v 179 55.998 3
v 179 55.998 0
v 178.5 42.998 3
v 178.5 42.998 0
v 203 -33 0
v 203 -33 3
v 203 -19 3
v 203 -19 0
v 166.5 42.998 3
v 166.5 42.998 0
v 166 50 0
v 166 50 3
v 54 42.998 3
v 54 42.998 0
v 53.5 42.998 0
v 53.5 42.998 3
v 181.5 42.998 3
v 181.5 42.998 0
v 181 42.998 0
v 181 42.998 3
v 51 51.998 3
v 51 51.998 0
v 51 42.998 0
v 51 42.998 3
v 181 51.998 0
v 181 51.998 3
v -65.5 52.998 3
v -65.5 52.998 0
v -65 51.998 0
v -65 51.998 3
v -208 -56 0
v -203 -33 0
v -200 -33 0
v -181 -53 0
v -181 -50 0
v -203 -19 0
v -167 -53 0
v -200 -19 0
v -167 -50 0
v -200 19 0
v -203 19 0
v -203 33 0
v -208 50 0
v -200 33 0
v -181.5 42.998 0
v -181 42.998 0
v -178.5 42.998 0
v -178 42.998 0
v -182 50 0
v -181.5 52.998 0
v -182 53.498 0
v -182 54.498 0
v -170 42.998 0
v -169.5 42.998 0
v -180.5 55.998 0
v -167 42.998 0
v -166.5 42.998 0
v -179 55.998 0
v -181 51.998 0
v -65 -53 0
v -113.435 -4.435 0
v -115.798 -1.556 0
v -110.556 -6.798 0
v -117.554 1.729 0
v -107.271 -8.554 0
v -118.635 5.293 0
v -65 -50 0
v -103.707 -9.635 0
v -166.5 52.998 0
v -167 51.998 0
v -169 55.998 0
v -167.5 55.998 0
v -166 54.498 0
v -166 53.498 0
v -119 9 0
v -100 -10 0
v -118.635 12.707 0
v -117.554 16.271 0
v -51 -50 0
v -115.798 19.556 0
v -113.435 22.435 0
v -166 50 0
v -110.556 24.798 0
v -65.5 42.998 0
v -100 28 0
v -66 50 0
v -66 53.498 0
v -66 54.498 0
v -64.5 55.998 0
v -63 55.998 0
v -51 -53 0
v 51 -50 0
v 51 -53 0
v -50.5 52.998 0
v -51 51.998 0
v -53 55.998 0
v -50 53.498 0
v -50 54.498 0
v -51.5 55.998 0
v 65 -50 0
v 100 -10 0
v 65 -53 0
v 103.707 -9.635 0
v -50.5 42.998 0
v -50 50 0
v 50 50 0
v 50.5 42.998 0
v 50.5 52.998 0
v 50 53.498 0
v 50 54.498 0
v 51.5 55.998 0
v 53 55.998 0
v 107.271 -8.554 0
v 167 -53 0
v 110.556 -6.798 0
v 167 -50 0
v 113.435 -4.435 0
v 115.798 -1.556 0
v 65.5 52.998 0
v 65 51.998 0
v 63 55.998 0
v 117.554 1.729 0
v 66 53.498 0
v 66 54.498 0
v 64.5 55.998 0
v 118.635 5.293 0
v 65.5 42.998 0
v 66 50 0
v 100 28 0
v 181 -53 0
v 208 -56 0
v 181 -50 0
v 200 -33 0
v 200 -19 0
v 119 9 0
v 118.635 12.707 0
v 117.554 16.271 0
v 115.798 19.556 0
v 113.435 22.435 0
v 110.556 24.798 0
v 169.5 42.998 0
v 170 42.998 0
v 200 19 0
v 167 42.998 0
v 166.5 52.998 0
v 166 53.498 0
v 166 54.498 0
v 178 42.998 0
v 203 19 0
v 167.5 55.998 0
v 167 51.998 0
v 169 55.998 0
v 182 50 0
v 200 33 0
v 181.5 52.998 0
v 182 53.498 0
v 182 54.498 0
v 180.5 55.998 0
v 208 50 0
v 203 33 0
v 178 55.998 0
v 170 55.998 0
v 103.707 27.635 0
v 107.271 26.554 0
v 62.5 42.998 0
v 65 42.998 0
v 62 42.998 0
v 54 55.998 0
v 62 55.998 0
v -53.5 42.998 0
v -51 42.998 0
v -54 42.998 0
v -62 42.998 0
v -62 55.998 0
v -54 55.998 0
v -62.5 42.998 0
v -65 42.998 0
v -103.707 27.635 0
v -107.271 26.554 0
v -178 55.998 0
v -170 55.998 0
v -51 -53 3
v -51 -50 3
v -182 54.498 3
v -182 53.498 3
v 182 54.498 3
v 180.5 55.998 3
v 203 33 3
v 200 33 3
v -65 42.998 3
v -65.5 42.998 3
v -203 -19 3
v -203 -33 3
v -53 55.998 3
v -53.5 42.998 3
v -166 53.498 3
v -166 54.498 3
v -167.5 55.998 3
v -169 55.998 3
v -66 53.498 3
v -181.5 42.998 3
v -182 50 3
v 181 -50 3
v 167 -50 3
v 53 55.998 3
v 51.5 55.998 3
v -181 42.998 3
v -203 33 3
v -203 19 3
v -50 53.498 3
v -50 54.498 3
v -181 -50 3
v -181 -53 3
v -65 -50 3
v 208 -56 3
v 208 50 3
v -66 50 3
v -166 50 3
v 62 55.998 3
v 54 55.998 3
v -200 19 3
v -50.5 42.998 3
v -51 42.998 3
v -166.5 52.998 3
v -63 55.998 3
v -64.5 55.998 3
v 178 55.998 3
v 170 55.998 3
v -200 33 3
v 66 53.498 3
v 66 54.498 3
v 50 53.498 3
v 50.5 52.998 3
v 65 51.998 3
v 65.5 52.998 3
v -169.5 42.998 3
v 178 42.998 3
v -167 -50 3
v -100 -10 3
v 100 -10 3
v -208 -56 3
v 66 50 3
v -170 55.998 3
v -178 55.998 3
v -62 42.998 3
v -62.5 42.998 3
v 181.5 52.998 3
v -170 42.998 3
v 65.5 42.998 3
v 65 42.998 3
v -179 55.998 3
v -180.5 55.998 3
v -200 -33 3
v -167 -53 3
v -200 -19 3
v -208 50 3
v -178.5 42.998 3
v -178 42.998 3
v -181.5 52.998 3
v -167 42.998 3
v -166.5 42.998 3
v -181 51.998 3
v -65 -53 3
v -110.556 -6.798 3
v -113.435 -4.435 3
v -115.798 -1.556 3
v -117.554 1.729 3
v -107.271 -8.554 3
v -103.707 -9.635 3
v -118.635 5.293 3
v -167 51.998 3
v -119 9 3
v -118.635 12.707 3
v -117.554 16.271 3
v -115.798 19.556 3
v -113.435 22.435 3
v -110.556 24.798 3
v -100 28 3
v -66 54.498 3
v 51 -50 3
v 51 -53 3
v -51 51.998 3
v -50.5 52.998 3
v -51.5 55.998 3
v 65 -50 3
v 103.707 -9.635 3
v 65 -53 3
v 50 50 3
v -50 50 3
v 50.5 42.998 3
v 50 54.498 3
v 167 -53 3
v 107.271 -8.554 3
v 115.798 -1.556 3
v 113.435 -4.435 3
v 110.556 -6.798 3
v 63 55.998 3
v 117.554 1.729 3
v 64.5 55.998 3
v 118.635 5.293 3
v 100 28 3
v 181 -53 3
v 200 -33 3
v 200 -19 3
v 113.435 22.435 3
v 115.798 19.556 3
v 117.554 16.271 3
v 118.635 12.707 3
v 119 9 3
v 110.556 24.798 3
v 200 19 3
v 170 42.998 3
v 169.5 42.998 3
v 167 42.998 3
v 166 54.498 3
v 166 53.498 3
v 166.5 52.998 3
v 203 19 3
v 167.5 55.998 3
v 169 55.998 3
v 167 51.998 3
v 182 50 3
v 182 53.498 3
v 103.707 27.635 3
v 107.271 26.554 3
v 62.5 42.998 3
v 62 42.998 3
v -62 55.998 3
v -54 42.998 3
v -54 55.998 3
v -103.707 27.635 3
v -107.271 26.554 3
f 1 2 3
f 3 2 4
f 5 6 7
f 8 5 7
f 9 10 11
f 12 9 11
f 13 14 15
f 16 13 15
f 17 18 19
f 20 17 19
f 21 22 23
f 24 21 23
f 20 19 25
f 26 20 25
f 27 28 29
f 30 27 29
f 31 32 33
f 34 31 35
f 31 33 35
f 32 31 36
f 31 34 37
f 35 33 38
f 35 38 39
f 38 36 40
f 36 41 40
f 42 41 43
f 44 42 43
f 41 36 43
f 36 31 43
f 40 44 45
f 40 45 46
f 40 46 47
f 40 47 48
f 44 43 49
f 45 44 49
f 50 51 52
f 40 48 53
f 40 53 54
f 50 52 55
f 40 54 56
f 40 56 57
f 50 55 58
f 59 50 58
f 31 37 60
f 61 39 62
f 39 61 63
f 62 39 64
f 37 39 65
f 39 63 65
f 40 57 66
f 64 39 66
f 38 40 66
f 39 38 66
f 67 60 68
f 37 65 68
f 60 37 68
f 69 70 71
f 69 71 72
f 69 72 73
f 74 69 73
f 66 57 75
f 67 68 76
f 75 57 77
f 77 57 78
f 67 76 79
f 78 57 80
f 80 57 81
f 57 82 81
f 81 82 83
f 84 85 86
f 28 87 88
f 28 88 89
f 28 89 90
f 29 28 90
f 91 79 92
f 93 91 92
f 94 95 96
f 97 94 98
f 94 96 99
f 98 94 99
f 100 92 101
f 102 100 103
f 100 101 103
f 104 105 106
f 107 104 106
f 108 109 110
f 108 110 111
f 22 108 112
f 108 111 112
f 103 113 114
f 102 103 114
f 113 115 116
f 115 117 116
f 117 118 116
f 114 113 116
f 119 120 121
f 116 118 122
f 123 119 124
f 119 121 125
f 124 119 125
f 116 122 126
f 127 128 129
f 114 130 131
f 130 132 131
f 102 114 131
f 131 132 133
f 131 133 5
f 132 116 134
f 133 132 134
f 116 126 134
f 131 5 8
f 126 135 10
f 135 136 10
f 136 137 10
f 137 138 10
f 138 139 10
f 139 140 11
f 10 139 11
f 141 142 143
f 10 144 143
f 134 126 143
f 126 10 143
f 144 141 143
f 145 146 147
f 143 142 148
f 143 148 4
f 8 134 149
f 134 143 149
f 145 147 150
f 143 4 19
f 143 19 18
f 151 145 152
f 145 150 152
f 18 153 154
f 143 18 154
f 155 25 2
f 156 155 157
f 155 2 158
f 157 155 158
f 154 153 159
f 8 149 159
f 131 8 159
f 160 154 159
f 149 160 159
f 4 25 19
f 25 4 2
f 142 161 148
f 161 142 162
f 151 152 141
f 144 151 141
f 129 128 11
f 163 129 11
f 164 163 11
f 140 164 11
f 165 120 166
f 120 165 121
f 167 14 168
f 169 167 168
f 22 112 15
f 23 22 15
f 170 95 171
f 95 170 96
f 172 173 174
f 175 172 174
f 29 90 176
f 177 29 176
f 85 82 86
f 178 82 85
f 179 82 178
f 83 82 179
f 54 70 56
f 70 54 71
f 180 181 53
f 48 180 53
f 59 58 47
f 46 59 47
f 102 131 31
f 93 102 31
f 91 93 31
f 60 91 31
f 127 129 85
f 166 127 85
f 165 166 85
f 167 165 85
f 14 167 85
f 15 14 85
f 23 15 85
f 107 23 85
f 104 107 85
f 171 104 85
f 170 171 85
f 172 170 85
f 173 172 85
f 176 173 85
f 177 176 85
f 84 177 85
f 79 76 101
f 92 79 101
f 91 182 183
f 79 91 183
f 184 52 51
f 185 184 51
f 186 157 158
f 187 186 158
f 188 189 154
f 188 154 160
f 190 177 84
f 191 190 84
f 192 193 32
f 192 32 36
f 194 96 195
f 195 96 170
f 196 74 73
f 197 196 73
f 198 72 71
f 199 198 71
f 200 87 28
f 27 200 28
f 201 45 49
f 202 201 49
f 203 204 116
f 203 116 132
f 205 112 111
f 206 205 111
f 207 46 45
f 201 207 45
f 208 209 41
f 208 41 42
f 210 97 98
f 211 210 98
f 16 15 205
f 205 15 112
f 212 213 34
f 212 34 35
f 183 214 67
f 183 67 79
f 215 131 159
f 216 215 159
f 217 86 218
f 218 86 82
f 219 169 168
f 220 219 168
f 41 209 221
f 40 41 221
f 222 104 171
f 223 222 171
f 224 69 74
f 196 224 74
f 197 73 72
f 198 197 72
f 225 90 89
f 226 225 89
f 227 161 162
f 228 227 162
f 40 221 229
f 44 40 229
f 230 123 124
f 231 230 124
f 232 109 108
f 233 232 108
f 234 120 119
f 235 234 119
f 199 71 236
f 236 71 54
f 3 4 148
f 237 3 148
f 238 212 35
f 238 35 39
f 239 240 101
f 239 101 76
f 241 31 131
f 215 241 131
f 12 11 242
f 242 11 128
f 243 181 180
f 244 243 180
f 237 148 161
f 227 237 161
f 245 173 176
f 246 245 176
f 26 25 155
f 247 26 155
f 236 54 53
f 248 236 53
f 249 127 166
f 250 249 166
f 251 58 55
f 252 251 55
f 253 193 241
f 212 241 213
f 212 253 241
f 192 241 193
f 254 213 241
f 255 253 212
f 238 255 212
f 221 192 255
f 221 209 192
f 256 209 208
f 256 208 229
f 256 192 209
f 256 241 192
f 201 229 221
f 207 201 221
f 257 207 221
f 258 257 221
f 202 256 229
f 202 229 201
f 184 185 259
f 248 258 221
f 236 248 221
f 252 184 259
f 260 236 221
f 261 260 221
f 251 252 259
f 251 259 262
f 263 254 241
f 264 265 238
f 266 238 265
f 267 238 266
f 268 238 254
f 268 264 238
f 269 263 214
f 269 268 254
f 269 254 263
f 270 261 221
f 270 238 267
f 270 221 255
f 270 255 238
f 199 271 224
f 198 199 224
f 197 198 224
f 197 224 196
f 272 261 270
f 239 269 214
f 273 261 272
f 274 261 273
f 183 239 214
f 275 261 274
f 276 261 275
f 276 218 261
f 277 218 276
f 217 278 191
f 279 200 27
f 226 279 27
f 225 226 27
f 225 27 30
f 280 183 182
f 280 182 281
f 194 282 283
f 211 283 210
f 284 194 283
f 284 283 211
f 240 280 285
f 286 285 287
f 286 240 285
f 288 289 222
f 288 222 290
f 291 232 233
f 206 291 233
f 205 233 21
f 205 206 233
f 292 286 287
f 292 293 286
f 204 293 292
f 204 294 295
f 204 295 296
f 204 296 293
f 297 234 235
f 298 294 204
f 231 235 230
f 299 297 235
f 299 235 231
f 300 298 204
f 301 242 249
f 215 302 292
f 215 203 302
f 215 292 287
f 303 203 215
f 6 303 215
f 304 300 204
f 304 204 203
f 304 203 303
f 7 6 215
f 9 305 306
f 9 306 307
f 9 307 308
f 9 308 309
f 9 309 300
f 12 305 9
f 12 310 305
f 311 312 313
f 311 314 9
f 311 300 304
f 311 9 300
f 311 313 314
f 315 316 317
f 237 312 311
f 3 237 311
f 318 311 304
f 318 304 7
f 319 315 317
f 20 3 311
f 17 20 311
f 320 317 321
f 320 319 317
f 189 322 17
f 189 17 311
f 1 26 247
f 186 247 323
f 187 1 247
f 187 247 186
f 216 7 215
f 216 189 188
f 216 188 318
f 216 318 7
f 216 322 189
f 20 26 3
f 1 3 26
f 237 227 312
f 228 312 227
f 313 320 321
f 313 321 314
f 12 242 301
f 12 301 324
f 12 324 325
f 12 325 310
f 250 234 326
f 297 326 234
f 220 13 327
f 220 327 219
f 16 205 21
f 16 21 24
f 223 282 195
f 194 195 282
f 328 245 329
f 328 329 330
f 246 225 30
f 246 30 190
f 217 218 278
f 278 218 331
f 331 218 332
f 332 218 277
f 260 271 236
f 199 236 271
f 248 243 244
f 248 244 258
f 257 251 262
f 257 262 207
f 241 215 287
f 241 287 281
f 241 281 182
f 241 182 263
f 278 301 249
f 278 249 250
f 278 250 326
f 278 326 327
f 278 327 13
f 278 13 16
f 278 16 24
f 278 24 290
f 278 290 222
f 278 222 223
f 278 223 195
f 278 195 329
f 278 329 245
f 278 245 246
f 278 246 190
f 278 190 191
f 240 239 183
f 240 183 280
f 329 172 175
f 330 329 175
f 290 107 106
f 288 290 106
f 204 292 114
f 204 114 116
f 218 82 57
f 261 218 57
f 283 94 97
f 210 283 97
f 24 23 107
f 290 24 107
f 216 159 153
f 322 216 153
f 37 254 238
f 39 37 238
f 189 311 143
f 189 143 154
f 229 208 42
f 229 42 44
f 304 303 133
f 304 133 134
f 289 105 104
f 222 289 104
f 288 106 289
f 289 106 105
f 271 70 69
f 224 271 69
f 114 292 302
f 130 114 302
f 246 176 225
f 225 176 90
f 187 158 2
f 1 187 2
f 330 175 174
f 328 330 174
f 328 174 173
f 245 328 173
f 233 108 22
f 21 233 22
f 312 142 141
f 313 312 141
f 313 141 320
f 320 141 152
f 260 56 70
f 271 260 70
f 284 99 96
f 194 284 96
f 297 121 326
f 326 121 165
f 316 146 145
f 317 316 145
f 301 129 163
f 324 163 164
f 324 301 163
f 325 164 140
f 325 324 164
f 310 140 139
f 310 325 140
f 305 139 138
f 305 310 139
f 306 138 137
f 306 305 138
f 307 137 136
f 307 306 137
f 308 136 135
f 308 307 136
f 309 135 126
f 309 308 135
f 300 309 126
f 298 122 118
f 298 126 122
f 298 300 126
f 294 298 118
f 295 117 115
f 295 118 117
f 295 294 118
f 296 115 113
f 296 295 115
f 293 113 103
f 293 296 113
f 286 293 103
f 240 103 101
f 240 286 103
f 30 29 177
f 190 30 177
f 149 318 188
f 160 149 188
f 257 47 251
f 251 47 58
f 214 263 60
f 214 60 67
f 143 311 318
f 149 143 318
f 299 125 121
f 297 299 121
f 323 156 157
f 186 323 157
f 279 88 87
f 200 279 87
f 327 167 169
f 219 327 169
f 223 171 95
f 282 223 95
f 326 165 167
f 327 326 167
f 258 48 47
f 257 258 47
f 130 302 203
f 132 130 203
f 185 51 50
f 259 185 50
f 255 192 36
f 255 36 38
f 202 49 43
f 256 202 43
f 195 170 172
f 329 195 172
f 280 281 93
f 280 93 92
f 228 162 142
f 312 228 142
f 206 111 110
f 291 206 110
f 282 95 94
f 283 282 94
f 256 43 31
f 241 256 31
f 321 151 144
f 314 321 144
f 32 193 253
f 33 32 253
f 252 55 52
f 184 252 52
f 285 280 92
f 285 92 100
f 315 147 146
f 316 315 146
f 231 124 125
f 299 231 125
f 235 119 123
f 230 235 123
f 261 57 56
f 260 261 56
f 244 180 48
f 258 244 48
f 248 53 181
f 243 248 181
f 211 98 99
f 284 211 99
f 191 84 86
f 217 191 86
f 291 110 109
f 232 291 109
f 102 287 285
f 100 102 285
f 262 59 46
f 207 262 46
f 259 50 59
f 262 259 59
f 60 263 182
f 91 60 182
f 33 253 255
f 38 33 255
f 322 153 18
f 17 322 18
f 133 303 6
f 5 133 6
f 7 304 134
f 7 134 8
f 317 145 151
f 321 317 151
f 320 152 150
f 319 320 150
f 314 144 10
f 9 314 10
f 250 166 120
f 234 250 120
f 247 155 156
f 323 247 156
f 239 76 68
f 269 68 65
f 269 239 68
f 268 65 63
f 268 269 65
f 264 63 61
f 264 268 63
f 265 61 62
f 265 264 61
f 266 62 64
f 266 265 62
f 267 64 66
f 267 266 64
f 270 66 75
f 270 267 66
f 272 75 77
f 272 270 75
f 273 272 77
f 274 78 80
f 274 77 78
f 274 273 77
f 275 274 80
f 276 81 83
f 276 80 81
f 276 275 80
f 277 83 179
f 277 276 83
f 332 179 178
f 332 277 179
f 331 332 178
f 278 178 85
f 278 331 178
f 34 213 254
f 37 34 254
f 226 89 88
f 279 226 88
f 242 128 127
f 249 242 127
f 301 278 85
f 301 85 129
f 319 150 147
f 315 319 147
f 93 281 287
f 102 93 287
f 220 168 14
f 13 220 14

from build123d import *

# Parameters (mm, degrees)
BOSS_EXTRUDE1_DEPTH = 3
CUT_EXTRUDE2_DEPTH  = 4
SKETCH8_W           = 14
SKETCH8_H           = 3
CUT_EXTRUDE3_DEPTH  = 3
SKETCH9_W           = 3
SKETCH9_H           = 14
CUT_EXTRUDE4_DEPTH  = 3


with BuildPart() as part:
    # Sketch1 → Boss-Extrude1 (new body)
    with BuildSketch(Plane.XY):
        Polygon((208, 50), (182, 50), (181.5, 42.997828908), (181, 42.997828908), (181, 51.997828908), (181.5, 52.997828908), (182, 53.497828908), (182, 54.497828908), (180.5, 55.997828908), (179, 55.997828908), (178.5, 42.997828908), (178, 42.997828908), (178, 55.997828908), (170, 55.997828908), (170, 42.997828908), (169.5, 42.997828908), (169, 55.997828908), (167.5, 55.997828908), (166, 54.497828908), (166, 53.497828908), (166.5, 52.997828908), (167, 51.997828908), (167, 42.997828908), (166.5, 42.997828908), (166, 50), (66, 50), (65.5, 42.997828908), (65, 42.997828908), (65, 51.997828908), (65.5, 52.997828908), (66, 53.497828908), (66, 54.497828908), (64.5, 55.997828908), (63, 55.997828908), (62.5, 42.997828908), (62, 42.997828908), (62, 55.997828908), (54, 55.997828908), (54, 42.997828908), (53.5, 42.997828908), (53, 55.997828908), (51.5, 55.997828908), (50, 54.497828908), (50, 53.497828908), (50.5, 52.997828908), (51, 51.997828908), (51, 42.997828908), (50.5, 42.997828908), (50, 50), (-50, 50), (-50.5, 42.997828908), (-51, 42.997828908), (-51, 51.997828908), (-50.5, 52.997828908), (-50, 53.497828908), (-50, 54.497828908), (-51.5, 55.997828908), (-53, 55.997828908), (-53.5, 42.997828908), (-54, 42.997828908), (-54, 55.997828908), (-62, 55.997828908), (-62, 42.997828908), (-62.5, 42.997828908), (-63, 55.997828908), (-64.5, 55.997828908), (-66, 54.497828908), (-66, 53.497828908), (-65.5, 52.997828908), (-65, 51.997828908), (-65, 42.997828908), (-65.5, 42.997828908), (-66, 50), (-166, 50), (-166.5, 42.997828908), (-167, 42.997828908), (-167, 51.997828908), (-166.5, 52.997828908), (-166, 53.497828908), (-166, 54.497828908), (-167.5, 55.997828908), (-169, 55.997828908), (-169.5, 42.997828908), (-170, 42.997828908), (-170, 55.997828908), (-178, 55.997828908), (-178, 42.997828908), (-178.5, 42.997828908), (-179, 55.997828908), (-180.5, 55.997828908), (-182, 54.497828908), (-182, 53.497828908), (-181.5, 52.997828908), (-181, 51.997828908), (-181, 42.997828908), (-181.5, 42.997828908), (-182, 50), (-208, 50), (-208, -56), (208, -56), align=None)
    extrude(amount=BOSS_EXTRUDE1_DEPTH)

    # Sketch4 → Cut-Extrude2 (cut, through all)
    with BuildSketch(Plane.XY.offset(3)):
        with BuildLine():
            Line((-100, 28), (100, 28))
            ThreePointArc((100, 28), (119, 9), (100, -10))
            Line((100, -10), (-100, -10))
            ThreePointArc((-100, -10), (-119, 9), (-100, 28))
        make_face()
    extrude(amount=-CUT_EXTRUDE2_DEPTH, mode=Mode.SUBTRACT)

    # Sketch8 → Cut-Extrude3 (cut)
    with BuildSketch(Plane.XY.offset(3)):
        with Locations((174, -51.5)):
            Rectangle(SKETCH8_W, SKETCH8_H)
        with Locations((-174, -51.5)):
            Rectangle(SKETCH8_W, SKETCH8_H)
        with Locations((58, -51.5)):
            Rectangle(SKETCH8_W, SKETCH8_H)
        with Locations((-58, -51.5)):
            Rectangle(SKETCH8_W, SKETCH8_H)
    extrude(amount=-CUT_EXTRUDE3_DEPTH, mode=Mode.SUBTRACT)

    # Sketch9 → Cut-Extrude4 (cut)
    with BuildSketch(Plane.XY.offset(3)):
        with Locations((201.5, 26)):
            Rectangle(SKETCH9_W, SKETCH9_H)
        with Locations((-201.5, 26)):
            Rectangle(SKETCH9_W, SKETCH9_H)
        with Locations((-201.5, -26)):
            Rectangle(SKETCH9_W, SKETCH9_H)
        with Locations((201.5, -26)):
            Rectangle(SKETCH9_W, SKETCH9_H)
    extrude(amount=-CUT_EXTRUDE4_DEPTH, mode=Mode.SUBTRACT)


solid = part.part
